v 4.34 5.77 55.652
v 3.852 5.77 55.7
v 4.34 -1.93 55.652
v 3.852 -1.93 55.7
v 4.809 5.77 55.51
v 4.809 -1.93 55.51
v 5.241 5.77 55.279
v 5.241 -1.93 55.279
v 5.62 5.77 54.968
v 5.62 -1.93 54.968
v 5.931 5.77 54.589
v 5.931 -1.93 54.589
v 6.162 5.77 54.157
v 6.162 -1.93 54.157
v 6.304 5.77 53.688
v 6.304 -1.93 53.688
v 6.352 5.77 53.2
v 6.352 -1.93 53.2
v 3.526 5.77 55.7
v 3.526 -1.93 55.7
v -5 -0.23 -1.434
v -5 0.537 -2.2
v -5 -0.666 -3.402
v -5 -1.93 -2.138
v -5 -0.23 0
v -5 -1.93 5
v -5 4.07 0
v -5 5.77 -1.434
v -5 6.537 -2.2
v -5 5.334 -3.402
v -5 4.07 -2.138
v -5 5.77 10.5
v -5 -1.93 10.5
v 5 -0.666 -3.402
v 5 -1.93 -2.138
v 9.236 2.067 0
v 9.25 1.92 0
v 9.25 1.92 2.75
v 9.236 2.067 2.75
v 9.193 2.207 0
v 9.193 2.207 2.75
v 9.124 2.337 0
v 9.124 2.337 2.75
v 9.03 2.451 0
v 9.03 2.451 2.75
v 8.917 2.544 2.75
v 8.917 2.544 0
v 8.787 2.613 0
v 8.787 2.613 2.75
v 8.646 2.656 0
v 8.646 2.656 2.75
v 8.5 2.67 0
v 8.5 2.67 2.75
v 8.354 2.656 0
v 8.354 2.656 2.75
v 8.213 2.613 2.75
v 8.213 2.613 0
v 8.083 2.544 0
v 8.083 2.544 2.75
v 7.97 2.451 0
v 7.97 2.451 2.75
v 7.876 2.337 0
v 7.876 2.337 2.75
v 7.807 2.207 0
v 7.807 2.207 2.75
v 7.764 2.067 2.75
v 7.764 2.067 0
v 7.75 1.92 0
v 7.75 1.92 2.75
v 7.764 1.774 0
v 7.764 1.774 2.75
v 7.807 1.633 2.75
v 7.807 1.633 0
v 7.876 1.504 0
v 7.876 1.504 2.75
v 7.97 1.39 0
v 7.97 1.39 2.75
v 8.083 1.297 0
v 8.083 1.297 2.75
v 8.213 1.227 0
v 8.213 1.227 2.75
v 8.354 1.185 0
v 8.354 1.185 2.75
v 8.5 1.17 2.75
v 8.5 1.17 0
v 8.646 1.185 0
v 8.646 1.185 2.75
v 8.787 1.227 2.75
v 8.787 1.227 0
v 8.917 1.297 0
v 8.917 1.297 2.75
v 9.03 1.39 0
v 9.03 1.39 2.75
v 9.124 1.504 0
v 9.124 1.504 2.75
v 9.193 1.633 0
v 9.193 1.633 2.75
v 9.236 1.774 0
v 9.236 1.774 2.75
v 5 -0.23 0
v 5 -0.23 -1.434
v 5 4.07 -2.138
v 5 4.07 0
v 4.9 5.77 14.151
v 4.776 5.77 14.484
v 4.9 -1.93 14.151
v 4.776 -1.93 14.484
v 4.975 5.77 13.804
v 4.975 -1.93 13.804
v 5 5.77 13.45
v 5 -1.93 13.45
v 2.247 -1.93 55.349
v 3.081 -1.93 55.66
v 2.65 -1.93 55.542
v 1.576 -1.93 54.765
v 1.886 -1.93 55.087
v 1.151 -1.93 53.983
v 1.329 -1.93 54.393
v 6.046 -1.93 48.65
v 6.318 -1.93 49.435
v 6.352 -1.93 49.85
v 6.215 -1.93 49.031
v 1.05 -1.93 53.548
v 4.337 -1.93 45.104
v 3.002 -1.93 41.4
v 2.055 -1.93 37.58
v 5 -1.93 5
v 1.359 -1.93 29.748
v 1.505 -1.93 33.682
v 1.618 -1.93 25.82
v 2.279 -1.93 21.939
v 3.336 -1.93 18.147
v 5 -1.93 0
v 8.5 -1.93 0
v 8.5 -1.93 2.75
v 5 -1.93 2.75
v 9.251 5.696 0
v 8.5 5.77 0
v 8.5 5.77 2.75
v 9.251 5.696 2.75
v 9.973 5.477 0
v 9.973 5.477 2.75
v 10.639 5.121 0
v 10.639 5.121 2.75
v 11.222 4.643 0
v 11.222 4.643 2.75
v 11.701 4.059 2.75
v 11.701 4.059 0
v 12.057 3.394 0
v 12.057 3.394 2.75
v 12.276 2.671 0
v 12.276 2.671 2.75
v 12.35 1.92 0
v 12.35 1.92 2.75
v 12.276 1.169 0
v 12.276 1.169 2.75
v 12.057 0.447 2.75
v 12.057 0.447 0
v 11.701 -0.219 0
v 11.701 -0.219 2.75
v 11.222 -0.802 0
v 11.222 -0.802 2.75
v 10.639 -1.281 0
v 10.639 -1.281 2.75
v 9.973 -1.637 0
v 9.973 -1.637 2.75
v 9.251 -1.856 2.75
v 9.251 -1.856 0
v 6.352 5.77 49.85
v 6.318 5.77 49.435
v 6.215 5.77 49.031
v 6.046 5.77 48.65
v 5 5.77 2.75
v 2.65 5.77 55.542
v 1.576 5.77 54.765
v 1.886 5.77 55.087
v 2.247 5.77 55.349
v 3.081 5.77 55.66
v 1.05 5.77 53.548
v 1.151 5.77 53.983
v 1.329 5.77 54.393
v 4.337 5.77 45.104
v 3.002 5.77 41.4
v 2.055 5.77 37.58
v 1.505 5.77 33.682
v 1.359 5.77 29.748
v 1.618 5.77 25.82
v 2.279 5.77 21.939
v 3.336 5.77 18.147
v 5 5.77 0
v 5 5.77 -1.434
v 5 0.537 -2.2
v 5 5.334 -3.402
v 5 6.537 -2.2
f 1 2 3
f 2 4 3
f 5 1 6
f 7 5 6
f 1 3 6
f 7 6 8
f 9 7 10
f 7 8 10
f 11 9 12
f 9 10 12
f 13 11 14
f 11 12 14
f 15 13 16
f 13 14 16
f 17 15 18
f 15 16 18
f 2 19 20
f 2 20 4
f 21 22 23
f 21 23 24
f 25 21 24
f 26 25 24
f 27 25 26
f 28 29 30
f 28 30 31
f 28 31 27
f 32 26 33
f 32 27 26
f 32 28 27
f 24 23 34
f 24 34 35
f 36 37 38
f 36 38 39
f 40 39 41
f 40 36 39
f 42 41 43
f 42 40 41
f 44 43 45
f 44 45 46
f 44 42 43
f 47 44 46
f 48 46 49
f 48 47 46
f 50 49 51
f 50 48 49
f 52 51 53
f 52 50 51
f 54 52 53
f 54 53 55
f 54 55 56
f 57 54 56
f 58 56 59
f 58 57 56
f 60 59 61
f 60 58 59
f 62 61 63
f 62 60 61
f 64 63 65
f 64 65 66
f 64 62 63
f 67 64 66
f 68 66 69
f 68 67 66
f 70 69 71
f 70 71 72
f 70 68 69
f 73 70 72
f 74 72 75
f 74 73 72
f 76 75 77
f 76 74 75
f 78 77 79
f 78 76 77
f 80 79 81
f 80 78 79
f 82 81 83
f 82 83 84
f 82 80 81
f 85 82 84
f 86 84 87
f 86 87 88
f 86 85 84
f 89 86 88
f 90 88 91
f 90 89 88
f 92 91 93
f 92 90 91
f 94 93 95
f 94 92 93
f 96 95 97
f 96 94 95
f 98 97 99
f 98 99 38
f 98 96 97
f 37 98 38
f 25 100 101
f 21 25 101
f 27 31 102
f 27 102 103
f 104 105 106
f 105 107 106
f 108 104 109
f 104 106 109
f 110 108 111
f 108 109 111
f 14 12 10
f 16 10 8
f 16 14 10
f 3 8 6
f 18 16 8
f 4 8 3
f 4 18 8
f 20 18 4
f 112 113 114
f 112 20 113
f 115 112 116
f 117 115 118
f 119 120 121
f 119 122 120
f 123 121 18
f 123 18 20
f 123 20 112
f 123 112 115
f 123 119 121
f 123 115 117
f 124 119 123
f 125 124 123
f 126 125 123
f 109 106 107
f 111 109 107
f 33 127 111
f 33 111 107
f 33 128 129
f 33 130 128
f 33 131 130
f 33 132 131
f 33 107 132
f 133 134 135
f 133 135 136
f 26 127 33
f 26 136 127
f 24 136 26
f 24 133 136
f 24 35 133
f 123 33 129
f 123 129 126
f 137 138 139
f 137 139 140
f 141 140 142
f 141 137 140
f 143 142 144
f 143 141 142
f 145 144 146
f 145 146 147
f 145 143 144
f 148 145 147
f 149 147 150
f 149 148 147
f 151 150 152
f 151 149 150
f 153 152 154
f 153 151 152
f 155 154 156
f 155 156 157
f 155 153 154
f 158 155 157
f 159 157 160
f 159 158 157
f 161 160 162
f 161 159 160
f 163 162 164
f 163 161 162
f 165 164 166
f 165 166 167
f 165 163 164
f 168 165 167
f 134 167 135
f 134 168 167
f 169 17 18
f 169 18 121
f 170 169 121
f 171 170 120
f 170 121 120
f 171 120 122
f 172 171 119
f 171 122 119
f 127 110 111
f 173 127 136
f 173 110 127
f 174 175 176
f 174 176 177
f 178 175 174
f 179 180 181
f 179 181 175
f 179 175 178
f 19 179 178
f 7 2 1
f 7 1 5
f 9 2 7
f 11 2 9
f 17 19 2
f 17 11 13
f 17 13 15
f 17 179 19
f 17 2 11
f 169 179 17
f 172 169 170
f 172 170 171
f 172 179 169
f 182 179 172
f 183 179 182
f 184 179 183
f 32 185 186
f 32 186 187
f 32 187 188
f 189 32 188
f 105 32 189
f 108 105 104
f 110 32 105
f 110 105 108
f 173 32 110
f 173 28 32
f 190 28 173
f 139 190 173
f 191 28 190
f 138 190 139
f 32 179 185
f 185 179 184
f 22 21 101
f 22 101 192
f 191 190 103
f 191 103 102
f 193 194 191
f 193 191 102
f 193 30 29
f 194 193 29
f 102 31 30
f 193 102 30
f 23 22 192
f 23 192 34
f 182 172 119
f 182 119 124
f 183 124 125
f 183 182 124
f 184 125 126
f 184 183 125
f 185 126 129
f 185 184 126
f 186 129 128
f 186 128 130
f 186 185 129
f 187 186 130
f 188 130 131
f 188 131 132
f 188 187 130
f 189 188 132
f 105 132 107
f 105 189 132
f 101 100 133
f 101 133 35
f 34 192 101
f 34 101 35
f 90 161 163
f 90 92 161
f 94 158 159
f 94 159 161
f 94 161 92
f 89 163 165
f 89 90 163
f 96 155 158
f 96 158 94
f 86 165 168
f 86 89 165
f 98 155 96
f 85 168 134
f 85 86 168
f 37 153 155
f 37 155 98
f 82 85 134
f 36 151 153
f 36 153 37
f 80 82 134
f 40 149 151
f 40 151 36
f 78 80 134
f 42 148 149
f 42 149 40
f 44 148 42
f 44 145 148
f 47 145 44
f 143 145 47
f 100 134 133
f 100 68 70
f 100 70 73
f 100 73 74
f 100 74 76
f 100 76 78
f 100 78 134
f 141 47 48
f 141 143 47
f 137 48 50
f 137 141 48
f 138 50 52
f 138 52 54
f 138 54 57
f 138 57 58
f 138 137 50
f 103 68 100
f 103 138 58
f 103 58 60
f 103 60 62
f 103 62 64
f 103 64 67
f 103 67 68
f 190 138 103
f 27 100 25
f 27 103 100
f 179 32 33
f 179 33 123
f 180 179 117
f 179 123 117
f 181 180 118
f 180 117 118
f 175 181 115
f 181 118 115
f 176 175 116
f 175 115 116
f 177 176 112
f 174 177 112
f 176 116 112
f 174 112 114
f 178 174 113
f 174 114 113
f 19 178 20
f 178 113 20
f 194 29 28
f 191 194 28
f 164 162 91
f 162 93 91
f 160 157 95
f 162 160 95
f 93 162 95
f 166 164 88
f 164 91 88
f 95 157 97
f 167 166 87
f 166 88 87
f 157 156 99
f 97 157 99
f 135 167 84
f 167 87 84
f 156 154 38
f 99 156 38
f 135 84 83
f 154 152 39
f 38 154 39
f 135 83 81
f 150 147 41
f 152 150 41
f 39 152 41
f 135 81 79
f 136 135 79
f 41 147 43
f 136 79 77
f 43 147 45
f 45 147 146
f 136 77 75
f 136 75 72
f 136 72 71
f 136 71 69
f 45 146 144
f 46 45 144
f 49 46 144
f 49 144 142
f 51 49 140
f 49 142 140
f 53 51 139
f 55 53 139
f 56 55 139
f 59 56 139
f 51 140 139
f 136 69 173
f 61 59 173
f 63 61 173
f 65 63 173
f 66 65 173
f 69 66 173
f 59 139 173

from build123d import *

# Parameters (mm, degrees)
SKETCH2_W           = 10
SKETCH2_H           = 14.768412439
BOSS_EXTRUDE1_DEPTH = 5
BOSS_EXTRUDE4_DEPTH = 10
SKETCH9_W           = 10
SKETCH9_H           = 3.18
SKETCH9_H_2         = 3.888412439
CUT_EXTRUDE3_DEPTH  = 5
BOSS_EXTRUDE5_DEPTH = 7.7
SKETCH12_R          = 0.75
BOSS_EXTRUDE7_DEPTH = 2.75
FILLET1_R           = 2.5


with BuildPart() as part:
    # Sketch2 → Boss-Extrude1 (new body)
    with BuildSketch(Plane.XY):
        with Locations((0, 1.566049366)):
            Rectangle(SKETCH2_W, SKETCH2_H)
    extrude(amount=BOSS_EXTRUDE1_DEPTH)

    # Sketch8 → Boss-Extrude4 (add)
    with BuildSketch(Plane.ZY.offset(5)):
        Polygon((-0.15, 5.770255585), (0, 5.770255585), (0, 4.070255585), (-0.15, 4.070255585), (-2.137867966, 4.070255585), (-3.402081528, 5.334469147), (-2.2, 6.536550675), (-1.43370491, 5.770255585), align=None)
        Polygon((-0.15, -1.929744415), (0, -1.929744415), (0, -0.229744415), (-0.15, -0.229744415), (-1.43370491, -0.229744415), (-2.2, 0.536550675), (-3.402081528, -0.665530853), (-2.137867966, -1.929744415), align=None)
    extrude(amount=-BOSS_EXTRUDE4_DEPTH)

    # Sketch9 → Cut-Extrude3 (cut)
    with BuildSketch(Plane(origin=(0, 0, 0), x_dir=(-1, 0, 0), z_dir=(0, 0, -1))):
        with Locations((0, 7.360255585)):
            Rectangle(SKETCH9_W, SKETCH9_H)
        with Locations((0, -3.873950635)):
            Rectangle(SKETCH9_W, SKETCH9_H_2)
    extrude(amount=-CUT_EXTRUDE3_DEPTH, mode=Mode.SUBTRACT)

    # Sketch10 → Boss-Extrude5 (add)
    with BuildSketch(Plane(origin=(0, 5.770255585, 0), x_dir=(1, 0, 0), z_dir=(0, 1, 0))):
        with BuildLine():
            Line((-5, -5), (-5, -10.5))
            Line((-5, -10.5), (1.352445729, -55.7))
            Line((1.352445729, -55.7), (6.352445729, -55.7))
            Line((6.352445729, -55.7), (6.352445729, -49.2))
            ThreePointArc((6.352445729, -49.2), (1.383429579, -31.764936646), (5, -14))
            Line((5, -14), (5, -5))
            Line((5, -5), (-5, -5))
        make_face()
    extrude(amount=-BOSS_EXTRUDE5_DEPTH)

    # Sketch12 → Boss-Extrude7 (add)
    with BuildSketch(Plane.XY):
        with BuildLine():
            Line((5, 5.770255585), (8.5, 5.770255585))
            ThreePointArc((8.5, 5.770255585), (12.35, 1.920255585), (8.5, -1.929744415))
            Line((8.5, -1.929744415), (5, -1.929744415))
            Line((5, -1.929744415), (5, 5.770255585))
        make_face()
        with Locations((8.5, 1.920255585)):
            Circle(SKETCH12_R, mode=Mode.SUBTRACT)
    extrude(amount=BOSS_EXTRUDE7_DEPTH)

    # Fillet1
    fillet1_edges = [part.edges().sort_by_distance(p)[0] for p in [
        (6.352445729, 1.920255585, 49.2),
        (5, 1.920255585, 14),
        (1.352445729, 1.920255585, 55.7),
        (6.352445729, 1.920255585, 55.7),
    ]]
    fillet(fillet1_edges, radius=FILLET1_R)


solid = part.part
